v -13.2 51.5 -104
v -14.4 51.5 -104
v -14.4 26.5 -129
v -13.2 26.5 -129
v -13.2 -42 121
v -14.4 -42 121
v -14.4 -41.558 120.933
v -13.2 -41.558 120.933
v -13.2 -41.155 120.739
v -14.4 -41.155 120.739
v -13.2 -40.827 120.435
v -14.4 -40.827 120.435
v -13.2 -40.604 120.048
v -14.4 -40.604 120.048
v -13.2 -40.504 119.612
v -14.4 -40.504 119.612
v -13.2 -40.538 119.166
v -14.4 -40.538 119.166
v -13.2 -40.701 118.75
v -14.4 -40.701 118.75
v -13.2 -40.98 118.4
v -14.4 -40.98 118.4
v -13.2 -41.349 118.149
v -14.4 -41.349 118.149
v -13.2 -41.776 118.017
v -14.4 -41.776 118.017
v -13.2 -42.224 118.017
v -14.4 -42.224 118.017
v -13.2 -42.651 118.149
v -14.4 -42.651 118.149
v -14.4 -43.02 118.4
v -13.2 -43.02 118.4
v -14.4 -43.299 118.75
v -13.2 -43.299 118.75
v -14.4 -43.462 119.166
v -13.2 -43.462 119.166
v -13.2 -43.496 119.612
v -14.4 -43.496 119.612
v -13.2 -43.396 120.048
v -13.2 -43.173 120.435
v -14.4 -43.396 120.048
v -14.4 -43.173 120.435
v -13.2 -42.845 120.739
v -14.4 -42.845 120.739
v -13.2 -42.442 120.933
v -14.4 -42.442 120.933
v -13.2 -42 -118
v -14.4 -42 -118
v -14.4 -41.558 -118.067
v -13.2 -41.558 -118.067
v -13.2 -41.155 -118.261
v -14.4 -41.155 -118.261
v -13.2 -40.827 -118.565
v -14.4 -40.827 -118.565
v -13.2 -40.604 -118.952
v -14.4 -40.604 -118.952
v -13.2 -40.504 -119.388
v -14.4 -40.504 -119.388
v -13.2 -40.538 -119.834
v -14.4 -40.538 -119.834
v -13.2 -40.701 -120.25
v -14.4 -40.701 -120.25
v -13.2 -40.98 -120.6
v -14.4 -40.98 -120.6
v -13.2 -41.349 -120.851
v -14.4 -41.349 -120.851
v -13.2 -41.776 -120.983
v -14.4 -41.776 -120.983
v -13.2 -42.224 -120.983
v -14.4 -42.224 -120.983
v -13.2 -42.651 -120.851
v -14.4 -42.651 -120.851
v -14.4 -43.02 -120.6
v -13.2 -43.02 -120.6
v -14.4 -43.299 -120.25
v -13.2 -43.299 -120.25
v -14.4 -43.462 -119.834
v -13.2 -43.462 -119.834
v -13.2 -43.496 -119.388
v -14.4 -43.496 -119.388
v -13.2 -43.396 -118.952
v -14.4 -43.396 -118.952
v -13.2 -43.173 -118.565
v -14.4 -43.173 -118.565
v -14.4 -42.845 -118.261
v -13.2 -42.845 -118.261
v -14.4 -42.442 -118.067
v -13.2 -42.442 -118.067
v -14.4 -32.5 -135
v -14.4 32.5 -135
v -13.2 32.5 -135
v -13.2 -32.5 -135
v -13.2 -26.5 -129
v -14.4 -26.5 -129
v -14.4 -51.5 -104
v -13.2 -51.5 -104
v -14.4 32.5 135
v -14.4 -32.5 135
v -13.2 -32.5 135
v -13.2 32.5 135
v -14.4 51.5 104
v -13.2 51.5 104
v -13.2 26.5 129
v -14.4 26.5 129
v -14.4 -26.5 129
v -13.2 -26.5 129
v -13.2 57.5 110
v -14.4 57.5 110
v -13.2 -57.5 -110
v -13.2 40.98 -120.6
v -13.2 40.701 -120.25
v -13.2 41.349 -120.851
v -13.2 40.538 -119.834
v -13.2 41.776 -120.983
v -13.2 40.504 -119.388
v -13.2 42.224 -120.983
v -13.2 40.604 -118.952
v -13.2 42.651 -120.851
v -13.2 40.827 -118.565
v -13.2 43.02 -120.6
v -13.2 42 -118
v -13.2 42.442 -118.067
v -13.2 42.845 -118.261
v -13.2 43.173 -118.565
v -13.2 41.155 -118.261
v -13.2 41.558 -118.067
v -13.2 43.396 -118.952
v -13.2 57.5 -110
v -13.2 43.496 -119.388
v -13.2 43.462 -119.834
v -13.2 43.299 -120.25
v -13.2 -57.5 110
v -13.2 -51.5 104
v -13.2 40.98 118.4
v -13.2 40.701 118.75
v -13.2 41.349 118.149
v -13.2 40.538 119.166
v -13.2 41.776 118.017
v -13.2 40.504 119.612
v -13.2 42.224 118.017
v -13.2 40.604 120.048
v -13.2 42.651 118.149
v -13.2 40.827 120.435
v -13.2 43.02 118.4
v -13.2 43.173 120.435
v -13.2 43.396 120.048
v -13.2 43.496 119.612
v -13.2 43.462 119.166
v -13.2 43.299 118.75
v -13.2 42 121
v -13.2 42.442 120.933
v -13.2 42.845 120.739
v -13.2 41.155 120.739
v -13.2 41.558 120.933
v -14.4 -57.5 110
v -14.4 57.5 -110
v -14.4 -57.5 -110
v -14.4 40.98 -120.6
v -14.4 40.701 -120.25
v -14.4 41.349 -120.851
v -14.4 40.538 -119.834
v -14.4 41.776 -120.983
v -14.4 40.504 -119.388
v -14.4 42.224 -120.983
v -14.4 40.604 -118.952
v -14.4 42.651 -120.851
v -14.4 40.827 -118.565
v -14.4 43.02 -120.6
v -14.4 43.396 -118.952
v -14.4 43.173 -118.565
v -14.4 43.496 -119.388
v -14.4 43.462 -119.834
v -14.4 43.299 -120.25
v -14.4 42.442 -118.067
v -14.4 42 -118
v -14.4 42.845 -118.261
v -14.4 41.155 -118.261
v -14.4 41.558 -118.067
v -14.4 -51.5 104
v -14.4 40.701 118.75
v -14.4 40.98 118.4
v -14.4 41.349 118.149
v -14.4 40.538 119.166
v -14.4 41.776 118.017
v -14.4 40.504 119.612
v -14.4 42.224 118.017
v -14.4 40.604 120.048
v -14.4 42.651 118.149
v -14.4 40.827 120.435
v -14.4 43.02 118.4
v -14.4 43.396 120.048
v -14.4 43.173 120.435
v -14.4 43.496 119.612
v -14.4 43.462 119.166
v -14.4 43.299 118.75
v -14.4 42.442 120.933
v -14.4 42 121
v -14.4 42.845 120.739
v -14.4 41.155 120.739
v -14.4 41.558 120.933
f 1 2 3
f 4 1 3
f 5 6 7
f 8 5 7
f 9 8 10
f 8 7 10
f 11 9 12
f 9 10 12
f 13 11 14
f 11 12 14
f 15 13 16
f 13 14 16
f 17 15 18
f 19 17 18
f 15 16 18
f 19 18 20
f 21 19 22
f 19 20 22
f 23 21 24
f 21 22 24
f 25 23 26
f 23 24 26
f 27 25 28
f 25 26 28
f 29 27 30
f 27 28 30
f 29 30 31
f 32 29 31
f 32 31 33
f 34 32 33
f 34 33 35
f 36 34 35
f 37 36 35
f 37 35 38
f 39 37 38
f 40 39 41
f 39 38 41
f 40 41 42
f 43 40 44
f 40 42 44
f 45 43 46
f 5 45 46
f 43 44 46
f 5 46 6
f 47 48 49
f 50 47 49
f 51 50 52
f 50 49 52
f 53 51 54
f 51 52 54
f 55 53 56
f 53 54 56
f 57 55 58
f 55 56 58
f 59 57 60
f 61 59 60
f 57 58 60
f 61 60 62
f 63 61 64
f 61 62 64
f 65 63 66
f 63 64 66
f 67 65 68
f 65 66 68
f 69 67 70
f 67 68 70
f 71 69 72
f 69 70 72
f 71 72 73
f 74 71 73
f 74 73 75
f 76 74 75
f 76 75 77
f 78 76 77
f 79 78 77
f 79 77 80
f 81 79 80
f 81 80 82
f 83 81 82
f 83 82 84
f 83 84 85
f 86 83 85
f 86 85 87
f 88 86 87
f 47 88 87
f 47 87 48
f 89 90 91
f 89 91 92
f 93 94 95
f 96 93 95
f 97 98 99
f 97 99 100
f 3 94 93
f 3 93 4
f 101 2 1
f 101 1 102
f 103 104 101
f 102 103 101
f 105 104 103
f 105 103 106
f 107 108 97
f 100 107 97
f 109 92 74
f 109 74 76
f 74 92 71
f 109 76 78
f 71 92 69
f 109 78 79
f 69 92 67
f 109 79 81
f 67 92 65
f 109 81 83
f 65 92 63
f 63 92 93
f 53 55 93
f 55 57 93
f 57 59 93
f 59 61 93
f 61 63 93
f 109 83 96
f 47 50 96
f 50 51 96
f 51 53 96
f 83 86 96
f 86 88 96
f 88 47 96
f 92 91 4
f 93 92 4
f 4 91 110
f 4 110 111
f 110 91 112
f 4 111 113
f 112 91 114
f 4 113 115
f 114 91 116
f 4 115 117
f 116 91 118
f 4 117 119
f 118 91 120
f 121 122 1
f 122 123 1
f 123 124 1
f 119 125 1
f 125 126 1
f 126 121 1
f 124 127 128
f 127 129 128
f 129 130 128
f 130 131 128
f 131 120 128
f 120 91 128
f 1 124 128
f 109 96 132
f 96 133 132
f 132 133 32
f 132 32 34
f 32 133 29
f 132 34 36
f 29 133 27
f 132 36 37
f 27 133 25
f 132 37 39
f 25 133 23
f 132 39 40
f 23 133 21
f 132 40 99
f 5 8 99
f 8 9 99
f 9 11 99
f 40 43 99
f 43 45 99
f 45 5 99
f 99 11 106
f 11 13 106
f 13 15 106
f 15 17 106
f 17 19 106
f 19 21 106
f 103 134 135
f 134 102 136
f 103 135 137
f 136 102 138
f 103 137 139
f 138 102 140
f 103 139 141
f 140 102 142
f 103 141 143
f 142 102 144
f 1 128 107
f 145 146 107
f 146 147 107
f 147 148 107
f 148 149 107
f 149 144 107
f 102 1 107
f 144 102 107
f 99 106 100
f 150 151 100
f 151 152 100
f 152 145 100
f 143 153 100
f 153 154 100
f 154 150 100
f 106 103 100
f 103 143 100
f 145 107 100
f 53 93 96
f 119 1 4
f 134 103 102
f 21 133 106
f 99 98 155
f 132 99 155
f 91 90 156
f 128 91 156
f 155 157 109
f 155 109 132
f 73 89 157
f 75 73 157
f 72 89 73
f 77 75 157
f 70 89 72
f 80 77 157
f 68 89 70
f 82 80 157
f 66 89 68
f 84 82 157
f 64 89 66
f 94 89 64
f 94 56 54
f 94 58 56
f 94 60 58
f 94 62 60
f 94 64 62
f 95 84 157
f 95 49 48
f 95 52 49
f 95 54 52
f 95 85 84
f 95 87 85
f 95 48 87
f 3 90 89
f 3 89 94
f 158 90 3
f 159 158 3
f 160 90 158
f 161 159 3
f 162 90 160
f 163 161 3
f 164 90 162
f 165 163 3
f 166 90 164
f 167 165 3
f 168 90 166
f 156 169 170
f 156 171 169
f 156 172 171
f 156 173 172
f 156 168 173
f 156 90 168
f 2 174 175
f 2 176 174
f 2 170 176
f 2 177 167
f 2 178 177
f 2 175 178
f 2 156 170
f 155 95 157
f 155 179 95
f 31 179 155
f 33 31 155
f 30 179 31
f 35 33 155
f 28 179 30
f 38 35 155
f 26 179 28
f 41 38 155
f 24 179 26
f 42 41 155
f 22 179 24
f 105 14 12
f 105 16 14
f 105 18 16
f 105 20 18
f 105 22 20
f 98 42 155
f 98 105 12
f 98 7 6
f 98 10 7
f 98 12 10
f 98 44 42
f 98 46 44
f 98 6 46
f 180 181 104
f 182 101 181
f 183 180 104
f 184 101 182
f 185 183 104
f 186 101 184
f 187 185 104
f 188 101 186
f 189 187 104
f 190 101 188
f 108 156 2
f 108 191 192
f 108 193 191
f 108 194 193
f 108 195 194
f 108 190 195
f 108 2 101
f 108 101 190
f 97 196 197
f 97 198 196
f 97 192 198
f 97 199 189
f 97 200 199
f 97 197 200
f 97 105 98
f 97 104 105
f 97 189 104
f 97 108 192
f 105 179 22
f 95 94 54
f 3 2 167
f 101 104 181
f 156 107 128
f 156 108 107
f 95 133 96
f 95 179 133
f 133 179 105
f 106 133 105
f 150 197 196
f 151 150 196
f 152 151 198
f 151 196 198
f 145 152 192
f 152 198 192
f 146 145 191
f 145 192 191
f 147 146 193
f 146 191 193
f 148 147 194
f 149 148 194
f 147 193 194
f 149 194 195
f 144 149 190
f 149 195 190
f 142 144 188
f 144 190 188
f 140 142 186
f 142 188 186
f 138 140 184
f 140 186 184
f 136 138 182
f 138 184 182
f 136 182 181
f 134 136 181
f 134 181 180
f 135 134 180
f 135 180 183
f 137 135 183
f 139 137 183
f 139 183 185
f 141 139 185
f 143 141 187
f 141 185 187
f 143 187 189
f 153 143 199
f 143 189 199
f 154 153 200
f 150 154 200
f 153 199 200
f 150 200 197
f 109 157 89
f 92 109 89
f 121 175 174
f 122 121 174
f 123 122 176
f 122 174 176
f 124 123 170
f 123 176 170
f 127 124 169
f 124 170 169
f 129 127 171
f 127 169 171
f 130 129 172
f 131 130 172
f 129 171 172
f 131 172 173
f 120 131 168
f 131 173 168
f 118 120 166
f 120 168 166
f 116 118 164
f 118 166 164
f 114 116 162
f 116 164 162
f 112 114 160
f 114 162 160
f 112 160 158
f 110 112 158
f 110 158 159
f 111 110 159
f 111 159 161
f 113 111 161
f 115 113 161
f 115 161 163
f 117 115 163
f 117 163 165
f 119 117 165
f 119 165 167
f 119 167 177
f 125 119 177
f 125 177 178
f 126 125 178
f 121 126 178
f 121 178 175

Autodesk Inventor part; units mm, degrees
ref_plane "YZ Plane" through (0, 0, 0) normal (1, 0, 0) x (0, 1, 0)
ref_plane "XZ Plane" through (0, 0, 0) normal (0, 1, 0) x (-1, 0, 0)
ref_plane "XY Plane" through (0, 0, 0) normal (0, 0, 1) x (1, 0, 0)
sketch "Sketch1" plane through (0, 0, 0) normal (1, 0, 0) x (0, 1, 0)
  line L0 (-57.5, 135) -> (57.5, 135)
  line L1 (57.5, 135) -> (57.5, -135)
  line L2 (57.5, -135) -> (-57.5, -135)
  line L3 (-57.5, -135) -> (-57.5, 135)
  line L4 (-57.5, 135) -> (57.5, -135) construction
  line L5 (57.5, 135) -> (-57.5, -135) construction
  circle A0 centre (0, 77.5) radius 3.925
  circle A1 centre (0, -77.5) radius 3.925
  circle A2 centre (-15, 0) radius 5
  line L6 (0, 77.5) -> (0, -77.5) construction
  line L7 (51.5, -129) -> (51.5, 129)
  line L8 (51.5, 129) -> (-51.5, 129)
  line L9 (-51.5, 129) -> (-51.5, -129)
  line L10 (-51.5, -129) -> (51.5, -129)
  point P0 (0, 0)
  dimension "d0" = 155
  dimension "d1" = 7.85
  dimension "d2" = 270
  dimension "d3" = 115
  dimension "d4" = 6
  dimension "d35" = 10
  dimension "d36" = 15
extrude "Extrusion1" add sketch "Sketch1" along normal blind 8 contours L0 L1 L2 L3 | A0 | A1 | L10 L9 L8 L7
extrude "Extrusion2" add sketch "Sketch1" against normal blind 14.4 contours L0 L1 L2 L3
sketch "Sketch2" plane through (8, 0, 0) normal (1, 0, 0) x (0, 0, -1)
  line L0 (135, -57.5) -> (135, 57.5) projected
  line L1 (135, 57.5) -> (-135, 57.5) projected
  line L2 (-135, 57.5) -> (-135, -57.5) projected
  line L3 (-135, -57.5) -> (135, -57.5) projected
  line L4 (-33.234, -33.234) -> (33.234, -33.234) construction
  line L5 (33.234, -33.234) -> (33.234, 33.234) construction
  line L6 (33.234, 33.234) -> (-33.234, 33.234) construction
  line L7 (-33.234, 33.234) -> (-33.234, -33.234) construction
  line L8 (-33.234, -33.234) -> (33.234, 33.234) construction
  line L9 (33.234, -33.234) -> (-33.234, 33.234) construction
  circle A0 centre (0, 0) radius 47 construction
  circle A1 centre (33.234, 33.234) radius 2.75
  circle A2 centre (-33.234, 33.234) radius 2.75
  circle A3 centre (0, 0) radius 47 construction
  circle A4 centre (-33.234, -33.234) radius 2.75
  circle A5 centre (0, 0) radius 47 construction
  circle A6 centre (33.234, -33.234) radius 2.75
  circle A7 centre (0, 0) radius 47 construction
  point P0 (0, 0)
  point P1 (0, 0)
  dimension "d12" = 94
  dimension "d13" = 5.5
  dimension "d16" = 360
extrude "Extrusion3" cut sketch "Sketch2" against normal through all contours A1 | A2 | A4 | A6
sketch "Sketch3" plane through (0, 0, 0) normal (-1, 0, 0) x (0, 0, 1)
  circle A0 centre (33.234, -33.234) radius 2.75 projected
  circle A1 centre (33.234, 33.234) radius 2.75 projected
  circle A2 centre (-33.234, -33.234) radius 2.75 projected
  circle A3 centre (-33.234, 33.234) radius 2.75 projected
  line L0 (-129, -51.5) -> (129, -51.5) projected
  line L1 (129, -51.5) -> (129, 51.5) projected
  line L2 (129, 51.5) -> (-129, 51.5) projected
  line L3 (-129, 51.5) -> (-129, -51.5) projected
  circle A4 centre (0, -15) radius 5 projected
  circle A5 centre (-33.234, 33.234) radius 4.5
  circle A6 centre (33.234, 33.234) radius 2.75 projected
  circle A7 centre (33.234, 33.234) radius 4.5
  circle A8 centre (-33.234, -33.234) radius 4.5
  circle A9 centre (33.234, -33.234) radius 4.5
  point P0 (0, 0)
  dimension "d20" = 9
extrude "Extrusion4" cut sketch "Sketch3" against normal blind 3 contours A0 | A1 | A2 | A3 | A5 | A7 | A8 | A9
sketch "Sketch4" plane through (8, 0, 0) normal (1, 0, 0) x (0, 0, -1)
  circle A0 centre (-33.234, -33.234) radius 2.75 projected
  circle A1 centre (-33.234, 33.234) radius 2.75 projected
  circle A2 centre (33.234, -33.234) radius 2.75 projected
  circle A3 centre (33.234, 33.234) radius 2.75 projected
  line L0 (135, -57.5) -> (135, 57.5) projected
  line L1 (135, 57.5) -> (-135, 57.5) projected
  line L2 (-135, 57.5) -> (-135, -57.5) projected
  line L3 (-135, -57.5) -> (135, -57.5) projected
  circle A4 centre (0, -15) radius 5 projected
  circle A5 centre (0, -15) radius 7.5
  point P0 (0, 0)
  dimension "d24" = 15
extrude "Extrusion5" cut sketch "Sketch4" against normal through all contours A4 | A5
chamfer "Chamfer2" distance 25 angle 45 8 edges at (-7.2, 51.5, -129) (-7.2, -51.5, -129) (-7.2, -51.5, 129) (-7.2, 51.5, 129) (-3.2, 57.5, -135) (-3.2, -57.5, -135) (-3.2, -57.5, 135) (-3.2, 57.5, 135)
sketch "Sketch6" plane through (-14.4, 0, 0) normal (-1, 0, 0) x (0, 0, 1)
  line L0 (110, 57.5) -> (135, 32.5) projected
  line L1 (110, 57.5) -> (-110, 57.5) projected
  line L2 (-135, 32.5) -> (-110, 57.5) projected
  line L3 (-135, 32.5) -> (-135, -32.5) projected
  line L4 (-110, -57.5) -> (-135, -32.5) projected
  line L5 (-110, -57.5) -> (110, -57.5) projected
  line L6 (135, -32.5) -> (110, -57.5) projected
  line L7 (135, -32.5) -> (135, 32.5) projected
  line L8 (-129, -26.5) -> (-129, 26.5) projected
  line L9 (-104, 51.5) -> (-129, 26.5) projected
  line L10 (-104, 51.5) -> (104, 51.5) projected
  line L11 (129, 26.5) -> (104, 51.5) projected
  line L12 (129, 26.5) -> (129, -26.5) projected
  line L13 (104, -51.5) -> (129, -26.5) projected
  line L14 (104, -51.5) -> (-104, -51.5) projected
  line L15 (-129, -26.5) -> (-104, -51.5) projected
  line L16 (119.5, -42) -> (-119.5, -42)
  line L17 (-119.5, -42) -> (-119.5, 42)
  line L18 (-119.5, 42) -> (119.5, 42)
  line L19 (119.5, 42) -> (119.5, -42)
  circle A0 centre (0, 0) radius 10.3
  line L20 (119.5, -42) -> (-119.5, 42) construction
  line L21 (-119.5, -42) -> (119.5, 42) construction
  circle A1 centre (-119.5, 42) radius 1.5
  circle A2 centre (-119.5, -42) radius 1.5
  circle A3 centre (119.5, -42) radius 1.5
  circle A4 centre (119.5, 42) radius 1.5
  line L22 (-122.5, 45) -> (-116.5, 39)
  dimension "d32" = 3
extrude "Extrusion7" cut sketch "Sketch6" against normal through all contours A2 L16 L17 | L17 L16 A2 | A1 L22 L17 | L17 L22 A1 | L22 L18 A1 | L22 A1 L18 | A3 L19 L16 | L16 L19 A3 | A4 L19 L18 | L18 L19 A4
sketch "Sketch12" plane through (0, 0, 0) normal (-1, 0, 0) x (0, 0, 1)
  circle A0 centre (-77.5, 0) radius 3.925 projected
  circle A1 centre (77.5, 0) radius 3.925 projected
  circle A2 centre (-77.5, 0) radius 11.15
  circle A3 centre (77.5, 0) radius 11.15
  point P0 (0, 0)
  dimension "d61" = 22.3
extrude "Extrusion13" cut sketch "Sketch12" against normal blind 5 contours A0 | A1 | A2 | A3
sketch "Sketch13" plane through (5, 0, -77.5) normal (-1, 0, 0) x (0, 0, 1)
  circle A0 centre (0, 0) radius 11.15 projected
  circle A1 centre (155, 0) radius 11.15 projected
  circle A2 centre (0, 0) radius 8.5
  circle A3 centre (155, 0) radius 8.5
  point P0 (77.5, 0)
  dimension "d64" = 17
  dimension "d65" = 17
extrude "Extrusion14" cut sketch "Sketch13" against normal through all contours A2 | A3
sketch "Sketch14" plane through (0, 0, 0) normal (-1, 0, 0) x (0, 0, 1)
  circle A0 centre (0, -15) radius 7.5 projected
  circle A1 centre (0, -15) radius 9.65
  point P0 (0, 0)
  dimension "d68" = 19.3
extrude "Extrusion15" cut sketch "Sketch14" against normal blind 3
ref_plane "Work Plane1" through (-8.4, 0, 0) normal (-1, 0, 0) x (0, 0, 1)
sketch "Sketch15" plane through (-8.4, 0, 0) normal (-1, 0, 0) x (0, 0, 1)
  circle A0 centre (-119.5, 42) radius 1.5 projected
  line L0 (-120.3667, 45.2345) -> (-117.1322, 44.3678)
  line L1 (-117.1322, 44.3678) -> (-116.2655, 41.1333)
  line L2 (-116.2655, 41.1333) -> (-118.6333, 38.7655)
  line L3 (-118.6333, 38.7655) -> (-121.8678, 39.6322)
  line L4 (-121.8678, 39.6322) -> (-122.7345, 42.8667)
  line L5 (-122.7345, 42.8667) -> (-120.3667, 45.2345)
  line L6 (-135, 32.5) -> (-110, 57.5) projected
  line L7 (-117.1322, 44.3678) -> (-120.1322, 47.3678)
  line L8 (-121.8678, 39.6322) -> (-124.8678, 42.6322)
  point P0 (0, 0)
  dimension "d72" = 5.8
extrude "Extrusion16" cut sketch "Sketch15" along normal blind 3
mirror "Mirror1" about plane through (0, 0, 0) normal (0, 1, 0) of "Extrusion16"
mirror "Mirror2" about plane through (0, 0, 0) normal (0, 0, 1) of "Extrusion16", "Mirror1"
sketch "Sketch16" plane through (0, 0, 0) normal (-1, 0, 0) x (0, 0, 1)
  circle A0 centre (-21.0923, 23.1558) radius 4
  circle A1 centre (-37.6476, -46.4615) radius 4
  circle A2 centre (0, -15) radius 9.65 projected
  circle A3 centre (77.5, 0) radius 11.15 projected
  circle A4 centre (-77.5, 0) radius 11.15 projected
  line L0 (129, 26.5) -> (104, 51.5) projected
  line L1 (104, 51.5) -> (-104, 51.5) projected
  line L2 (-104, 51.5) -> (-129, 26.5) projected
  line L3 (-129, 26.5) -> (-129, -26.5) projected
  line L4 (-129, -26.5) -> (-104, -51.5) projected
  line L5 (-104, -51.5) -> (104, -51.5) projected
  line L6 (104, -51.5) -> (129, -26.5) projected
  line L7 (129, -26.5) -> (129, 26.5) projected
  circle A5 centre (-33.234, -33.234) radius 4.5 projected
  circle A6 centre (33.234, 33.234) radius 4.5 projected
  circle A7 centre (33.234, -33.234) radius 4.5 projected
  circle A8 centre (-33.234, 33.234) radius 4.5 projected
  line L8 (0, 0) -> (0, 21.7983)
  circle A9 centre (21.0923, 23.1558) radius 4
  circle A10 centre (37.6476, -46.4615) radius 4
  dimension "d75" = 8
  dimension "d76" = 8
extrude "Extrusion17" add sketch "Sketch16" along normal up to surface (14.4 mm away) contours A0 | A1 | A9 | A10
sketch "Sketch17" plane through (-14.4, 23.1558, -21.0923) normal (-1, 0, 0) x (0, 0, 1)
  circle A0 centre (0, 0) radius 4 projected
  circle A1 centre (42.1847, 0) radius 4 projected
  circle A2 centre (-16.5553, -69.6173) radius 4 projected
  circle A3 centre (58.7399, -69.6173) radius 4 projected
  circle A4 centre (-16.5553, -69.6173) radius 1.5
  circle A5 centre (58.7399, -69.6173) radius 1.5
  circle A6 centre (0, 0) radius 1.5
  circle A7 centre (42.1847, 0) radius 1.5
  point P0 (21.0923, -23.1558)
  dimension "d79" = 3
extrude "Extrusion18" cut sketch "Sketch17" against normal through all contours A4 | A5 | A6 | A7
chamfer "Chamfer3" distance 3 angle 75 4 edges at (0, -46.4615, -41.6476) (0, 23.1558, -25.0923) (0, 23.1558, 17.0923) (0, -46.4615, 33.6476)
sketch "Sketch18" plane through (-14.4, 0, 0) normal (-1, 0, 0) x (0, 0, 1)
  line L0 (-382.8162, -193.5683) -> (382.8162, -193.5683)
  line L1 (382.8162, -193.5683) -> (382.8162, 193.5683)
  line L2 (382.8162, 193.5683) -> (-382.8162, 193.5683)
  line L3 (-382.8162, 193.5683) -> (-382.8162, -193.5683)
  line L4 (-382.8162, -193.5683) -> (382.8162, 193.5683) construction
  line L5 (382.8162, -193.5683) -> (-382.8162, 193.5683) construction
  circle A0 centre (119.5, -42) radius 1.5 projected
  circle A1 centre (-119.5, -42) radius 1.5 projected
  circle A2 centre (119.5, 42) radius 1.5 projected
  circle A3 centre (-119.5, 42) radius 1.5 projected
  line L6 (110, 57.5) -> (135, 32.5) projected
  line L7 (110, 57.5) -> (-110, 57.5) projected
  line L8 (-135, 32.5) -> (-110, 57.5) projected
  line L9 (-135, 32.5) -> (-135, -32.5) projected
  line L10 (-110, -57.5) -> (-135, -32.5) projected
  line L11 (-110, -57.5) -> (110, -57.5) projected
  line L12 (135, -32.5) -> (110, -57.5) projected
  line L13 (135, -32.5) -> (135, 32.5) projected
  line L14 (-129, -26.5) -> (-129, 26.5) projected
  line L15 (-104, 51.5) -> (-129, 26.5) projected
  line L16 (-104, 51.5) -> (104, 51.5) projected
  line L17 (129, 26.5) -> (104, 51.5) projected
  line L18 (129, 26.5) -> (129, -26.5) projected
  line L19 (104, -51.5) -> (129, -26.5) projected
  line L20 (104, -51.5) -> (-104, -51.5) projected
  line L21 (-129, -26.5) -> (-104, -51.5) projected
  point P0 (0, 0)
extrude "Extrusion19" cut sketch "Sketch18" against normal blind 22.4 contours L3 L2 L1 L0 | A0 | A1 | A2 | A3 | L6 L13 L12 L11 L10 L9 L8 L7 | L14 L15 L16 L17 L18 L19 L20 L21
extrude "Extrusion20" add sketch "Sketch18" against normal blind 1.2 contours L6 L13 L12 L11 L10 L9 L8 L7
properties part number "CAJA" material "Steel, Mild, Welded"
